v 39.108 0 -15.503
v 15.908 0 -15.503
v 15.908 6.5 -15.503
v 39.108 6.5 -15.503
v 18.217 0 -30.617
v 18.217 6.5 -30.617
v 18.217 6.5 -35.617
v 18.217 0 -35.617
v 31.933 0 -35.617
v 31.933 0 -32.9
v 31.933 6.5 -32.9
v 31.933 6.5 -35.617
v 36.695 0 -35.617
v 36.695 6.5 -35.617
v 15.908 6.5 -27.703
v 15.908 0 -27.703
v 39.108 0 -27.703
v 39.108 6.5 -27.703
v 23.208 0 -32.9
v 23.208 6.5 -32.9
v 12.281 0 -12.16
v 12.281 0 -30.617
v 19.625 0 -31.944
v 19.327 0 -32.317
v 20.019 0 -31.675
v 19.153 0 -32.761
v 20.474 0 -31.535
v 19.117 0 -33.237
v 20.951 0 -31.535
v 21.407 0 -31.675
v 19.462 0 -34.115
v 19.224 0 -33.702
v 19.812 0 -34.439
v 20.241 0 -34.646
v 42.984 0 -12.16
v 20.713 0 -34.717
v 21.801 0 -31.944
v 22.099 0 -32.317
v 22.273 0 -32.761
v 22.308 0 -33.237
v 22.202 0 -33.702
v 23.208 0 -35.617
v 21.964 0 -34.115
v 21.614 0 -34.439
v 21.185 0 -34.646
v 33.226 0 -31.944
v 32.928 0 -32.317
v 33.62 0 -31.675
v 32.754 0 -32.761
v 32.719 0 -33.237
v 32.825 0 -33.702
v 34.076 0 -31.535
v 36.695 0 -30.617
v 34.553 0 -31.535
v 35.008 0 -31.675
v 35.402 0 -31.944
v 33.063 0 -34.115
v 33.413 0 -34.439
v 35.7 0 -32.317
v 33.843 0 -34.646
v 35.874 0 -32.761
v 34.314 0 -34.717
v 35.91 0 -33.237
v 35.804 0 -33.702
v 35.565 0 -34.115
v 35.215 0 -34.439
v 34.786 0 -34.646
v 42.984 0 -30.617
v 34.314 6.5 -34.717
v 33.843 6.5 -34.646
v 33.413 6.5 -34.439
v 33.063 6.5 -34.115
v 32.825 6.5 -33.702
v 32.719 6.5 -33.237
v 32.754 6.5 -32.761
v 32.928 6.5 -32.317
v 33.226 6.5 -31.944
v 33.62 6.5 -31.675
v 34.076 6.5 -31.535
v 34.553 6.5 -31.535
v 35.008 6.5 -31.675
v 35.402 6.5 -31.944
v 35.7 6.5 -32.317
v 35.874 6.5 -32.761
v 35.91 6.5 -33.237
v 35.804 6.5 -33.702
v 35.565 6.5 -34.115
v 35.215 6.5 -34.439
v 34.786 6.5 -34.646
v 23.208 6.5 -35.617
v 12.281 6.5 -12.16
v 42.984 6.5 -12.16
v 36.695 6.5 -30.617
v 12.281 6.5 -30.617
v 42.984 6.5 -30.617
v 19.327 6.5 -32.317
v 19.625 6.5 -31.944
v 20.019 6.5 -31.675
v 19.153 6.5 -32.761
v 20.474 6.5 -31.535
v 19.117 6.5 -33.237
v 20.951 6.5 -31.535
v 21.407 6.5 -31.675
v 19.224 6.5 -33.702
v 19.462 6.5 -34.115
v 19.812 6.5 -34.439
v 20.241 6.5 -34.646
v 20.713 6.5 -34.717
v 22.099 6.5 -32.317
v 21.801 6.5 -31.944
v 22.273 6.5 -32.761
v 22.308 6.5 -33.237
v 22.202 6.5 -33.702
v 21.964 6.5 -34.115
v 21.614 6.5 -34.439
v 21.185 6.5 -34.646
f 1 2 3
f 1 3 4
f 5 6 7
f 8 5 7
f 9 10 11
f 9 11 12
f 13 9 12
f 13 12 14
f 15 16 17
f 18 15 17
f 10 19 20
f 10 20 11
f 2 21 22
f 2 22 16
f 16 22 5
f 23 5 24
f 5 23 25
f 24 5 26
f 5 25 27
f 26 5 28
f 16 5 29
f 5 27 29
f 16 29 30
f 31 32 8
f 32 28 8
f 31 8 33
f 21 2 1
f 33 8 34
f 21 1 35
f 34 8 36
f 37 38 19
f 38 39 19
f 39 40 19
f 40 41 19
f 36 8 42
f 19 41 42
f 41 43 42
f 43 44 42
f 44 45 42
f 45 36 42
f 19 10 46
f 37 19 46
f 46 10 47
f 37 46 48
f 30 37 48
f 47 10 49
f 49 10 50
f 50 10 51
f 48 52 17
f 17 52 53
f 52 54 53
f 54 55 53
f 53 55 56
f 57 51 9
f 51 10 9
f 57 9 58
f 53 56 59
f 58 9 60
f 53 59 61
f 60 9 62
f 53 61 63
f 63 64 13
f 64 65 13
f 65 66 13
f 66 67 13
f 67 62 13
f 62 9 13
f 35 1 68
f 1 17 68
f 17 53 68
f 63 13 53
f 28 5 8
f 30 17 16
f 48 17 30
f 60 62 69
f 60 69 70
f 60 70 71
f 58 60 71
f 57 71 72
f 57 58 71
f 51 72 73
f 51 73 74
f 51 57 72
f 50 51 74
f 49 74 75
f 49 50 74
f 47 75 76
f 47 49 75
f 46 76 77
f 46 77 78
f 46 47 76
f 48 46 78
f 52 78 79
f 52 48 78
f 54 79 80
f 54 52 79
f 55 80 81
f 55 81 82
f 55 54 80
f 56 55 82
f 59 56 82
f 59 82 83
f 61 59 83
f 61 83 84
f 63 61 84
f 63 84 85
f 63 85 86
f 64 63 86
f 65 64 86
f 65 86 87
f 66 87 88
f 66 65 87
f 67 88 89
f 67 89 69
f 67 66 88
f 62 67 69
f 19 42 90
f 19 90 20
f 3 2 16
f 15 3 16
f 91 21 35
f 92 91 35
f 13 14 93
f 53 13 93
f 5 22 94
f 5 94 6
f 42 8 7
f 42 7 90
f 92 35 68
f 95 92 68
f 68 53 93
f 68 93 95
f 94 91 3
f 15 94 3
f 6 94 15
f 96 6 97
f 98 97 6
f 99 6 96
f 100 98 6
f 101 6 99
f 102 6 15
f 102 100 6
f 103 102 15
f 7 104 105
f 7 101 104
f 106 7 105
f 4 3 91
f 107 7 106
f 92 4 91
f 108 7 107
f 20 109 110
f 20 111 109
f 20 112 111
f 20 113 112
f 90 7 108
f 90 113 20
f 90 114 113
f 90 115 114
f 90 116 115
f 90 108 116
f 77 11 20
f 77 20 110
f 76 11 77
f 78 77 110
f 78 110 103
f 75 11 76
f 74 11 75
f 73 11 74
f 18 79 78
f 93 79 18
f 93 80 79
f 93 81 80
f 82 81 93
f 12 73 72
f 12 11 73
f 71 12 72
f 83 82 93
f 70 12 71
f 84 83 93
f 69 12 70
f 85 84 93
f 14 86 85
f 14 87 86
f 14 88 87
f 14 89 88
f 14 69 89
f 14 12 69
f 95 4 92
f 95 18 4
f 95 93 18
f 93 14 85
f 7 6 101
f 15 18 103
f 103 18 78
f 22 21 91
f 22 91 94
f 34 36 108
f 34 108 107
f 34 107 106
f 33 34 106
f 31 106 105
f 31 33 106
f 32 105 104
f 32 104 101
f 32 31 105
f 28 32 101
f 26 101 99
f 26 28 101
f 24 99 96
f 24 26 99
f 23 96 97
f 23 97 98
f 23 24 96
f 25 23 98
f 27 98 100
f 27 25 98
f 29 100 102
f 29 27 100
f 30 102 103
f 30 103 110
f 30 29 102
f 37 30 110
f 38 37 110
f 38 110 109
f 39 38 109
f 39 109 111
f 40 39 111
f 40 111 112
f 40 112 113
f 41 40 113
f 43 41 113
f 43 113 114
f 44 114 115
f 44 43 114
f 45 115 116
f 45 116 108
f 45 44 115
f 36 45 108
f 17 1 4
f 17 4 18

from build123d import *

# Parameters (mm, degrees)
SKETCH1_R           = 1.6
SKETCH1_W           = 30.70266837
SKETCH1_H           = 18.457088441
SKETCH1_W_2         = 23.2
SKETCH1_H_2         = 12.2
BOSS_EXTRUDE5_DEPTH = 6.5


with BuildPart() as part:
    # Sketch1 → Boss-Extrude5 (new body)
    # profile 1 of 2: a face of its own
    with BuildSketch(Plane(origin=(0, 0, 0), x_dir=(1, 0, 0), z_dir=(0, 1, 0))):
        Polygon((23.208363186, 35.61697891), (23.208363186, 32.900104101), (31.932950893, 32.900104101), (31.932950893, 35.61697891), (36.695280427, 35.61697891), (36.695280427, 30.61697891), (18.217441835, 30.61697891), (18.217441835, 35.61697891), align=None)
        with Locations(Location((20.712902511, 33.11697891, 0), (0, 0, 90))):
            Circle(SKETCH1_R, mode=Mode.SUBTRACT)
        with Locations(Location((34.31411566, 33.11697891, 0), (0, 0, 90))):
            Circle(SKETCH1_R, mode=Mode.SUBTRACT)
    # profile 2 of 2: a face of its own
    with BuildSketch(Plane(origin=(0, 0, 0), x_dir=(1, 0, 0), z_dir=(0, 1, 0))):
        with Locations((27.63237184, 21.38843469)):
            Rectangle(SKETCH1_W, SKETCH1_H)
        with Locations((27.508406256, 21.602944359)):
            Rectangle(SKETCH1_W_2, SKETCH1_H_2, mode=Mode.SUBTRACT)
    extrude(amount=BOSS_EXTRUDE5_DEPTH)


solid = part.part
